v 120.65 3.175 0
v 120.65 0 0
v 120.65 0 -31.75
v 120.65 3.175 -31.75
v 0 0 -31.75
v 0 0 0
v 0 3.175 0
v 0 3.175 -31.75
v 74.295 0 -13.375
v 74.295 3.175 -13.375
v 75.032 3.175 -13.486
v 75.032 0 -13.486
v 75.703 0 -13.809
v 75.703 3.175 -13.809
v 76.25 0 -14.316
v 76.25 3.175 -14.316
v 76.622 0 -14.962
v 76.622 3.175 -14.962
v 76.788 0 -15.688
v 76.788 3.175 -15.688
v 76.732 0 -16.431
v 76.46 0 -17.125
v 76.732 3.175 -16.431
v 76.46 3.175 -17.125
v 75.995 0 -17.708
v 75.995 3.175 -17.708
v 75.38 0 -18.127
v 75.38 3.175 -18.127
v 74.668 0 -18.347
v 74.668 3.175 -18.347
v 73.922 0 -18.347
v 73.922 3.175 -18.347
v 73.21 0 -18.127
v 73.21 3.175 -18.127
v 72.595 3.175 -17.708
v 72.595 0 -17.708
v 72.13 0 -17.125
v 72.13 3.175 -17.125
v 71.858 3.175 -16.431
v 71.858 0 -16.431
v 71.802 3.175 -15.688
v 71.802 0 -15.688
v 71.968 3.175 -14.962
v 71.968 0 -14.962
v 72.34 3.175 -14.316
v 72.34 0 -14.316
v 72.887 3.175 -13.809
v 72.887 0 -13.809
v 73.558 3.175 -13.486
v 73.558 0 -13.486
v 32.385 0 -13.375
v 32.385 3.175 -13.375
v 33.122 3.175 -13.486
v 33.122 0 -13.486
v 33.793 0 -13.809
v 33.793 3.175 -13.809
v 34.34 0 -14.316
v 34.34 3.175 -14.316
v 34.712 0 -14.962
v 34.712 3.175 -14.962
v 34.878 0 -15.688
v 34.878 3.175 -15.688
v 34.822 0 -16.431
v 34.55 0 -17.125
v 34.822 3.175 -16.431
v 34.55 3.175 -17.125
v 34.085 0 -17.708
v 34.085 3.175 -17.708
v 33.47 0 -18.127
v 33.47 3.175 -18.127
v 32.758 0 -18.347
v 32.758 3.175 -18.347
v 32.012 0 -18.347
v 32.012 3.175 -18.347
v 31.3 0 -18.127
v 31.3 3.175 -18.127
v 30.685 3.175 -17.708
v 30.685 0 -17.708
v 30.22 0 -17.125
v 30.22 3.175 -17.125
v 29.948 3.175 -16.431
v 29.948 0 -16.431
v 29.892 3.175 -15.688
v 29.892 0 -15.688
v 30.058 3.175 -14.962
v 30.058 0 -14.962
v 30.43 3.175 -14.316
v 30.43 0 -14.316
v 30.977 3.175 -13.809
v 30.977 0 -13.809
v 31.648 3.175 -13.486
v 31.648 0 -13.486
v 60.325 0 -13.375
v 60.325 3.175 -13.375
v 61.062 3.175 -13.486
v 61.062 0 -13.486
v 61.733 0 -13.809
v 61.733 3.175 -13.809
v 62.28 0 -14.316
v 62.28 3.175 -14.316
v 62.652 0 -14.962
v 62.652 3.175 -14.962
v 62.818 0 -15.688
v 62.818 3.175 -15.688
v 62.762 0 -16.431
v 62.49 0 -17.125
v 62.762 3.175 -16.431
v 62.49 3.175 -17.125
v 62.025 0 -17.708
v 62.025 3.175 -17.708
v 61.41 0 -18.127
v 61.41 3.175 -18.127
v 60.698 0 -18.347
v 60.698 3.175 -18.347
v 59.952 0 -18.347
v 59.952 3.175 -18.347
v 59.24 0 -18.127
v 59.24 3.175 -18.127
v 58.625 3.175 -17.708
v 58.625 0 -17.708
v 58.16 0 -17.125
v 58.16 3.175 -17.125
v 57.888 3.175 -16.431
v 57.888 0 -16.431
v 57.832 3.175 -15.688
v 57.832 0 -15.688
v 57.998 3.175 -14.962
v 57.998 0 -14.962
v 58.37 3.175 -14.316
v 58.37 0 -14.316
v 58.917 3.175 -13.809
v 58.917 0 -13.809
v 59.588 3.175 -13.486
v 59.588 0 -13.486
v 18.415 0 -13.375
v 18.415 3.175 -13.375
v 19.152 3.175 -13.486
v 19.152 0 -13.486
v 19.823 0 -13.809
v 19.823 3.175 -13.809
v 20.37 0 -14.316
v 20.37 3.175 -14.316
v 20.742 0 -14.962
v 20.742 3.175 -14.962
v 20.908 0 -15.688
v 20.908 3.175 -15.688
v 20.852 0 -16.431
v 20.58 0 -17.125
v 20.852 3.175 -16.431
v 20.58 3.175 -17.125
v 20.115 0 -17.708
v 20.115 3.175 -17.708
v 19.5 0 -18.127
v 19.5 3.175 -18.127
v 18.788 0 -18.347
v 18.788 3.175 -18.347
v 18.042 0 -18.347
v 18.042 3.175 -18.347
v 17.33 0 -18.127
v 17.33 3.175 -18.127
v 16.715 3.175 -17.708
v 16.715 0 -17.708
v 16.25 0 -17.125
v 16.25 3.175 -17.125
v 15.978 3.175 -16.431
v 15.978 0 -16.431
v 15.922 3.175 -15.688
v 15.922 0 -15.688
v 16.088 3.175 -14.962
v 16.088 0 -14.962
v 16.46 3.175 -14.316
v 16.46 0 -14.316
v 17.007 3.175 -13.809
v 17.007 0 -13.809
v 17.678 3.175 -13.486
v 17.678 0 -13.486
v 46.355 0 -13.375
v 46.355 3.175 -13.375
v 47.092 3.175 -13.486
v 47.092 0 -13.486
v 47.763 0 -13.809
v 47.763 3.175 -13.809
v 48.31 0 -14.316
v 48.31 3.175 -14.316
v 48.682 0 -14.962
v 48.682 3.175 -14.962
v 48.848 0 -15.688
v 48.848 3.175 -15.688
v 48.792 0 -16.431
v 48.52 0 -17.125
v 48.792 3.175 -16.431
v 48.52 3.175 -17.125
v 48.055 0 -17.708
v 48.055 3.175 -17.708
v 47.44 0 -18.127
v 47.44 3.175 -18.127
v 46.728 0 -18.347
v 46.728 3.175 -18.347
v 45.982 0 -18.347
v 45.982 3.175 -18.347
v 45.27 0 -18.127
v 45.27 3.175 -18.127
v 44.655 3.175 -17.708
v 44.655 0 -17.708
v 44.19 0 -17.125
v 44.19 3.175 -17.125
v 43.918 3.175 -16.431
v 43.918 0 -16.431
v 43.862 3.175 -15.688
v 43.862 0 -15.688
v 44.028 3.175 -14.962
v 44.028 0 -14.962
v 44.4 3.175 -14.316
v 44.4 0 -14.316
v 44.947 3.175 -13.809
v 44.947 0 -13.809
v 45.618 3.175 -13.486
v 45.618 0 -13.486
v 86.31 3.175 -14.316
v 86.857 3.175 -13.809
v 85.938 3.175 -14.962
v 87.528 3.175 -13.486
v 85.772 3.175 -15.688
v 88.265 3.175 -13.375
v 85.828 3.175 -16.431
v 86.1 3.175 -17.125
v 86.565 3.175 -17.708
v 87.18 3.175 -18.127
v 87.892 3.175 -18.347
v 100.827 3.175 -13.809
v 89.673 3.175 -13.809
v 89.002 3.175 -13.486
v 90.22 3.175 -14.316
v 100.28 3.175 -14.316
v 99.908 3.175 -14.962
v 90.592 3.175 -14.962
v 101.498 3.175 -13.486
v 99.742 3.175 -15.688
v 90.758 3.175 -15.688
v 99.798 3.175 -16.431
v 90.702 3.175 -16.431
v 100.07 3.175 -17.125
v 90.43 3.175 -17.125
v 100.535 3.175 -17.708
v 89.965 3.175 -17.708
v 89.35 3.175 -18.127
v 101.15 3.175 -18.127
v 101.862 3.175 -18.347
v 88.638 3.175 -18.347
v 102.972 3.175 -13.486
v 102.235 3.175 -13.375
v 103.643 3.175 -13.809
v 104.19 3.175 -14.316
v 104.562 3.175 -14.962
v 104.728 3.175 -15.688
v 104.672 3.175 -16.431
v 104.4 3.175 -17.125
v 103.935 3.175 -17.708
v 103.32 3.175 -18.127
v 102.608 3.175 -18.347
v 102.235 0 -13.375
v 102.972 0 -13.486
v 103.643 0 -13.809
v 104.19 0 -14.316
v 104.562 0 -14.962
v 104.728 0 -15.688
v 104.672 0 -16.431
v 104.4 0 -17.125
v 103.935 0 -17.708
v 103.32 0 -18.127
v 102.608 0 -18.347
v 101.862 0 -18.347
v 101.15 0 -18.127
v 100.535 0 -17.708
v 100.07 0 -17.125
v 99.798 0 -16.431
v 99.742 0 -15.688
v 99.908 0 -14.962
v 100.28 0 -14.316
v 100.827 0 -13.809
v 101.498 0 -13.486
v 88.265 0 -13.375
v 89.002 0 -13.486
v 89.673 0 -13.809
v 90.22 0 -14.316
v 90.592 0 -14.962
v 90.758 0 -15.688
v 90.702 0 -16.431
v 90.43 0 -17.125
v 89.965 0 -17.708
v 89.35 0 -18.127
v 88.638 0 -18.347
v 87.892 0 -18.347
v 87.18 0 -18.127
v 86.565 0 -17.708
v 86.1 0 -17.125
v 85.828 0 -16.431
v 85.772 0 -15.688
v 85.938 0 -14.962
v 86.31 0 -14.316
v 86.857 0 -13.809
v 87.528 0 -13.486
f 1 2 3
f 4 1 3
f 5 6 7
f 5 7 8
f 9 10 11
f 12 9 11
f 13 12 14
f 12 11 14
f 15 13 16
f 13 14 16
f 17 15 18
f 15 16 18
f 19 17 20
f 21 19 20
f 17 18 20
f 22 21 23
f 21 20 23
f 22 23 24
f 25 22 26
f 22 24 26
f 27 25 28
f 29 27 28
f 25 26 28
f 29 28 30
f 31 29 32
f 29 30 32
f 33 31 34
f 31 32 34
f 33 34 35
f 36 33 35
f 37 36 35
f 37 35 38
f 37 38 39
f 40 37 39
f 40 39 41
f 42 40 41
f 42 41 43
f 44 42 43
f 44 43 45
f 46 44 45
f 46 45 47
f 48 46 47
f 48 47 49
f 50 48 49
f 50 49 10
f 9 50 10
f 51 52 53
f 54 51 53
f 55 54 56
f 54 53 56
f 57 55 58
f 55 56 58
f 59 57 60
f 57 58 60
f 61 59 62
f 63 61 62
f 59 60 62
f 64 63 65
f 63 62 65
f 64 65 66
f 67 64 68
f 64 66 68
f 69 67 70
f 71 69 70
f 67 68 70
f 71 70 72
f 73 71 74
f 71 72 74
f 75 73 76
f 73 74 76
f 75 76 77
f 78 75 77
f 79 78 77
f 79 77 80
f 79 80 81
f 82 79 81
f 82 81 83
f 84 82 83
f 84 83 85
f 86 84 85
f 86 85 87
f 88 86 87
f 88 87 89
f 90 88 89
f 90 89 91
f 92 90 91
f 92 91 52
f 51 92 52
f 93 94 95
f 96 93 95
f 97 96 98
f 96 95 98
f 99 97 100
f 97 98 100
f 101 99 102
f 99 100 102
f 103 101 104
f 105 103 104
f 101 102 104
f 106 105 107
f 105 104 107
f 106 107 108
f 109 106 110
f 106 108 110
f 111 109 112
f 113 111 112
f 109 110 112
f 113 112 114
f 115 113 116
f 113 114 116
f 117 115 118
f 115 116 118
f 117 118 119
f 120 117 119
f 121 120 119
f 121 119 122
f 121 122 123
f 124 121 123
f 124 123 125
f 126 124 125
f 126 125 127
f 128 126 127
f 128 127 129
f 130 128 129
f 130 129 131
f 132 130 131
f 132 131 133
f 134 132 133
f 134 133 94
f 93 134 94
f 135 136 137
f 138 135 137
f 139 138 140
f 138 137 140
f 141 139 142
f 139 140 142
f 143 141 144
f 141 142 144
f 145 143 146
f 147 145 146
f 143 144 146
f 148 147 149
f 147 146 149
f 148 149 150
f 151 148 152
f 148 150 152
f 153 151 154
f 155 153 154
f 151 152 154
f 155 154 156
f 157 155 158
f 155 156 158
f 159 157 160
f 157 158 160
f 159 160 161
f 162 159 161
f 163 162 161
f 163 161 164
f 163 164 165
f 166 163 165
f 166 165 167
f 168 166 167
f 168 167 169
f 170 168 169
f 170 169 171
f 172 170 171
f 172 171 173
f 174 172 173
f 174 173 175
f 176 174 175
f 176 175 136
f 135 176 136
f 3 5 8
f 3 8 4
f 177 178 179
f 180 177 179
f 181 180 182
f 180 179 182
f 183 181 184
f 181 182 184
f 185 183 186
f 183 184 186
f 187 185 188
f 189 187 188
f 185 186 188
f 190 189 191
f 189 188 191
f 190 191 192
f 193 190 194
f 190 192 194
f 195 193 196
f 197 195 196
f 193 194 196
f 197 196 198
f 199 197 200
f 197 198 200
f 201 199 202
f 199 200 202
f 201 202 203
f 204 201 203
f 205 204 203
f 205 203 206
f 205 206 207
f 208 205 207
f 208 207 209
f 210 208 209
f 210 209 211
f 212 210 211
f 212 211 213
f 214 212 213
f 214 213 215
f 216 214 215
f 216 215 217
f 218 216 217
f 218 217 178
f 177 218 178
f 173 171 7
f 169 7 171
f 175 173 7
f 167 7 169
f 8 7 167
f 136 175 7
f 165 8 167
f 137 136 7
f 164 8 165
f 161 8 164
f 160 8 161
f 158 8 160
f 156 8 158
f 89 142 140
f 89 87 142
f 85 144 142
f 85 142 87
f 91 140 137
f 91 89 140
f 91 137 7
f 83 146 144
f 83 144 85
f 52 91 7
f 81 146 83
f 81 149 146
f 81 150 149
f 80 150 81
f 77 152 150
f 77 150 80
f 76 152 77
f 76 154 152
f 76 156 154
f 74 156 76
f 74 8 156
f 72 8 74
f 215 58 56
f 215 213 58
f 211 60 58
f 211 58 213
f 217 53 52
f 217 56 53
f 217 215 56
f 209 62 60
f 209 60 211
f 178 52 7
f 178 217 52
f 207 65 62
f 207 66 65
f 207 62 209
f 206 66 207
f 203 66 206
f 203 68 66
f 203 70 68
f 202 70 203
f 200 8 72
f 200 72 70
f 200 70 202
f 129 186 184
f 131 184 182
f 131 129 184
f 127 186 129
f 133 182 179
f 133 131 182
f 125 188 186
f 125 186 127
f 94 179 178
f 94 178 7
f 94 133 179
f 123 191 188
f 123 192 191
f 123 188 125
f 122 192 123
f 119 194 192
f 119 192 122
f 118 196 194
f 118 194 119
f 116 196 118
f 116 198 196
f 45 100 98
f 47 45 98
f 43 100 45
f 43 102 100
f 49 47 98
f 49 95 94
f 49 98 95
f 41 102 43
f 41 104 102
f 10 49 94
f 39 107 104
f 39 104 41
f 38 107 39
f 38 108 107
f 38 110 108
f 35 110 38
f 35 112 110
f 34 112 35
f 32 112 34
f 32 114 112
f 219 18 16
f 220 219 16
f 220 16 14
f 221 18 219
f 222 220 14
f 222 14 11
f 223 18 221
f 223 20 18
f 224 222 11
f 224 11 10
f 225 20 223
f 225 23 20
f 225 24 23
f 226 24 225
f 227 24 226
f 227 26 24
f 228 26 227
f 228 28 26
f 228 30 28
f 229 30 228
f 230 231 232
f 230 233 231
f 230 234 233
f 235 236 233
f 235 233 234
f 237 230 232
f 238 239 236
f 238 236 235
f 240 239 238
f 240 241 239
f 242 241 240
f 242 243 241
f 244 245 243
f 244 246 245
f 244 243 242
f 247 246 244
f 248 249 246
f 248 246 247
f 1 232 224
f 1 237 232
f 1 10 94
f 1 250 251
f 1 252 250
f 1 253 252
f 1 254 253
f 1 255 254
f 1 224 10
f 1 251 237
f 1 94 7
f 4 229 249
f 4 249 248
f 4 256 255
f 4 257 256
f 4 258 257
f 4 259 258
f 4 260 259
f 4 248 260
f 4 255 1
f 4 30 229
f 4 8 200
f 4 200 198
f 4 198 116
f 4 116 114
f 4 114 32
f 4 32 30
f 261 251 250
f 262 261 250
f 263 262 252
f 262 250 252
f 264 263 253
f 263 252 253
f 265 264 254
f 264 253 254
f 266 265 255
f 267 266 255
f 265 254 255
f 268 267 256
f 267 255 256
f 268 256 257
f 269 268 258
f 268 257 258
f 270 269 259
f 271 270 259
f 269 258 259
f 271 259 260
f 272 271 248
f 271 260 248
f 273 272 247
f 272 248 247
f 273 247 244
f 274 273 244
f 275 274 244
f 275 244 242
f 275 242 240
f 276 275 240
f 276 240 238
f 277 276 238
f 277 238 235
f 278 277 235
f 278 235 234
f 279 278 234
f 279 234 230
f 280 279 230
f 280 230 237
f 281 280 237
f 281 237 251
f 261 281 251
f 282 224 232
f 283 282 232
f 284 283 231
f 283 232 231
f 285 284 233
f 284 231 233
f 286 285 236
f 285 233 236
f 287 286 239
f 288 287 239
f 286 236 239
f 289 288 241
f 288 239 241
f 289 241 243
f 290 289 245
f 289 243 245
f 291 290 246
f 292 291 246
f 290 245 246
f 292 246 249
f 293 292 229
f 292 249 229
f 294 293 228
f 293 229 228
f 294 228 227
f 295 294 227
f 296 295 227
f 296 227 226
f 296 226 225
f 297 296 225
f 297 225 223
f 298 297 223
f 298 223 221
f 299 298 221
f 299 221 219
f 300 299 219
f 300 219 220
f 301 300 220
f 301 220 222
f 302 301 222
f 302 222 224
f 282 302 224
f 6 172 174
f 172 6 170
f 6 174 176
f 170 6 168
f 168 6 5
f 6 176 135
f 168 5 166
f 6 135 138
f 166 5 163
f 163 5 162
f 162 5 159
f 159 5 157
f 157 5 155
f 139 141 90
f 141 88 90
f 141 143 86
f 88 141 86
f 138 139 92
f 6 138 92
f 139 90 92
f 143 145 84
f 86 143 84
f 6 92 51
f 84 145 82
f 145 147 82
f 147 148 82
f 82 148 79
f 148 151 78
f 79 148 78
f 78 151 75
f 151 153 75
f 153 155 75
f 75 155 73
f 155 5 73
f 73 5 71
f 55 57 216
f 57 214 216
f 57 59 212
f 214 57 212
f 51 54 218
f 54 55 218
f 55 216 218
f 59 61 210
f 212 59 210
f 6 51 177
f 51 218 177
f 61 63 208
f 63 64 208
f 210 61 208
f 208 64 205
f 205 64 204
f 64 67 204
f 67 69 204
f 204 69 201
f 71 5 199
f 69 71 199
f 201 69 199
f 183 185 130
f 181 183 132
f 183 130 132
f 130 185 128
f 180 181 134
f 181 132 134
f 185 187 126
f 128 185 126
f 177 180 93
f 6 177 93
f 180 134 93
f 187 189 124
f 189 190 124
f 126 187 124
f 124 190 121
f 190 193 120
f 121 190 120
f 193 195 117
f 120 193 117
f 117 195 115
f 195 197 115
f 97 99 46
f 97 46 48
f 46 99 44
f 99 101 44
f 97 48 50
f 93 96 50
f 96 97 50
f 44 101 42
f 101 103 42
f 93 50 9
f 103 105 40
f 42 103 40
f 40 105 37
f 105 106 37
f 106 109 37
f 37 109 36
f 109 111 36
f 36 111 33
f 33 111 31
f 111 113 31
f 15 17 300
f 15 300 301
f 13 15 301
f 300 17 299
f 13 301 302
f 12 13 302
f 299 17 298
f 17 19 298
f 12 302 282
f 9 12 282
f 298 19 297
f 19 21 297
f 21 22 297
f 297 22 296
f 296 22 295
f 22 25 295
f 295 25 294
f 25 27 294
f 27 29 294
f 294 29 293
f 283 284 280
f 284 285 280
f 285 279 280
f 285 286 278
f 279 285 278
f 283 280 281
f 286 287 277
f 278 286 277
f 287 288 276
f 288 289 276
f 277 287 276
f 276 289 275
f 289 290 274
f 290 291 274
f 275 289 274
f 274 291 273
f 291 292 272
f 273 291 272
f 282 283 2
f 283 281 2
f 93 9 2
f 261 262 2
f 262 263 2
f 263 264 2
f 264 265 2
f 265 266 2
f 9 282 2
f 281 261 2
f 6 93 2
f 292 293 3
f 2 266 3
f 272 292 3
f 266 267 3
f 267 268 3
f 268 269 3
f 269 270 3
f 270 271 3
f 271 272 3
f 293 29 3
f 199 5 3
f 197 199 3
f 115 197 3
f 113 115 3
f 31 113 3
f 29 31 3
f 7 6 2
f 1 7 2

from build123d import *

# Parameters (mm, degrees)
SKETCH1_W           = 120.65
SKETCH1_H           = 31.75
BOSS_EXTRUDE1_DEPTH = 3.175
SKETCH2_R           = 2.5
CUT_EXTRUDE1_DEPTH  = 5.08
LPATTERN2_COUNT     = 4
LPATTERN2_PITCH     = 13.97
LPATTERN2_COL_COUNT = 4
LPATTERN2_COL_PITCH = 13.97


with BuildPart() as part:
    # Sketch1 → Boss-Extrude1 (new body)
    with BuildSketch(Plane(origin=(0, 0, 0), x_dir=(1, 0, 0), z_dir=(0, 1, 0))):
        with Locations((60.325, 15.875)):
            Rectangle(SKETCH1_W, SKETCH1_H)
    extrude(amount=BOSS_EXTRUDE1_DEPTH)

    # Sketch2 → Cut-Extrude1 (cut)
    with BuildSketch(Plane(origin=(0, 3.175, 0), x_dir=(1, 0, 0), z_dir=(0, 1, 0))):
        with Locations(Location((60.325, 15.875, 0), (0, 0, 270))):
            Circle(SKETCH2_R)
    cut_extrude1 = extrude(amount=-CUT_EXTRUDE1_DEPTH, mode=Mode.SUBTRACT)

    # LPattern2: Cut-Extrude1 ×4
    with Locations(*[(i * LPATTERN2_PITCH, 0, 0) for i in range(1, LPATTERN2_COUNT)]):
        add(cut_extrude1, mode=Mode.SUBTRACT)

    # LPattern2 col: Cut-Extrude1 ×4
    with Locations(*[(-i * LPATTERN2_COL_PITCH, 0, 0) for i in range(1, LPATTERN2_COL_COUNT)]):
        add(cut_extrude1, mode=Mode.SUBTRACT)


solid = part.part
